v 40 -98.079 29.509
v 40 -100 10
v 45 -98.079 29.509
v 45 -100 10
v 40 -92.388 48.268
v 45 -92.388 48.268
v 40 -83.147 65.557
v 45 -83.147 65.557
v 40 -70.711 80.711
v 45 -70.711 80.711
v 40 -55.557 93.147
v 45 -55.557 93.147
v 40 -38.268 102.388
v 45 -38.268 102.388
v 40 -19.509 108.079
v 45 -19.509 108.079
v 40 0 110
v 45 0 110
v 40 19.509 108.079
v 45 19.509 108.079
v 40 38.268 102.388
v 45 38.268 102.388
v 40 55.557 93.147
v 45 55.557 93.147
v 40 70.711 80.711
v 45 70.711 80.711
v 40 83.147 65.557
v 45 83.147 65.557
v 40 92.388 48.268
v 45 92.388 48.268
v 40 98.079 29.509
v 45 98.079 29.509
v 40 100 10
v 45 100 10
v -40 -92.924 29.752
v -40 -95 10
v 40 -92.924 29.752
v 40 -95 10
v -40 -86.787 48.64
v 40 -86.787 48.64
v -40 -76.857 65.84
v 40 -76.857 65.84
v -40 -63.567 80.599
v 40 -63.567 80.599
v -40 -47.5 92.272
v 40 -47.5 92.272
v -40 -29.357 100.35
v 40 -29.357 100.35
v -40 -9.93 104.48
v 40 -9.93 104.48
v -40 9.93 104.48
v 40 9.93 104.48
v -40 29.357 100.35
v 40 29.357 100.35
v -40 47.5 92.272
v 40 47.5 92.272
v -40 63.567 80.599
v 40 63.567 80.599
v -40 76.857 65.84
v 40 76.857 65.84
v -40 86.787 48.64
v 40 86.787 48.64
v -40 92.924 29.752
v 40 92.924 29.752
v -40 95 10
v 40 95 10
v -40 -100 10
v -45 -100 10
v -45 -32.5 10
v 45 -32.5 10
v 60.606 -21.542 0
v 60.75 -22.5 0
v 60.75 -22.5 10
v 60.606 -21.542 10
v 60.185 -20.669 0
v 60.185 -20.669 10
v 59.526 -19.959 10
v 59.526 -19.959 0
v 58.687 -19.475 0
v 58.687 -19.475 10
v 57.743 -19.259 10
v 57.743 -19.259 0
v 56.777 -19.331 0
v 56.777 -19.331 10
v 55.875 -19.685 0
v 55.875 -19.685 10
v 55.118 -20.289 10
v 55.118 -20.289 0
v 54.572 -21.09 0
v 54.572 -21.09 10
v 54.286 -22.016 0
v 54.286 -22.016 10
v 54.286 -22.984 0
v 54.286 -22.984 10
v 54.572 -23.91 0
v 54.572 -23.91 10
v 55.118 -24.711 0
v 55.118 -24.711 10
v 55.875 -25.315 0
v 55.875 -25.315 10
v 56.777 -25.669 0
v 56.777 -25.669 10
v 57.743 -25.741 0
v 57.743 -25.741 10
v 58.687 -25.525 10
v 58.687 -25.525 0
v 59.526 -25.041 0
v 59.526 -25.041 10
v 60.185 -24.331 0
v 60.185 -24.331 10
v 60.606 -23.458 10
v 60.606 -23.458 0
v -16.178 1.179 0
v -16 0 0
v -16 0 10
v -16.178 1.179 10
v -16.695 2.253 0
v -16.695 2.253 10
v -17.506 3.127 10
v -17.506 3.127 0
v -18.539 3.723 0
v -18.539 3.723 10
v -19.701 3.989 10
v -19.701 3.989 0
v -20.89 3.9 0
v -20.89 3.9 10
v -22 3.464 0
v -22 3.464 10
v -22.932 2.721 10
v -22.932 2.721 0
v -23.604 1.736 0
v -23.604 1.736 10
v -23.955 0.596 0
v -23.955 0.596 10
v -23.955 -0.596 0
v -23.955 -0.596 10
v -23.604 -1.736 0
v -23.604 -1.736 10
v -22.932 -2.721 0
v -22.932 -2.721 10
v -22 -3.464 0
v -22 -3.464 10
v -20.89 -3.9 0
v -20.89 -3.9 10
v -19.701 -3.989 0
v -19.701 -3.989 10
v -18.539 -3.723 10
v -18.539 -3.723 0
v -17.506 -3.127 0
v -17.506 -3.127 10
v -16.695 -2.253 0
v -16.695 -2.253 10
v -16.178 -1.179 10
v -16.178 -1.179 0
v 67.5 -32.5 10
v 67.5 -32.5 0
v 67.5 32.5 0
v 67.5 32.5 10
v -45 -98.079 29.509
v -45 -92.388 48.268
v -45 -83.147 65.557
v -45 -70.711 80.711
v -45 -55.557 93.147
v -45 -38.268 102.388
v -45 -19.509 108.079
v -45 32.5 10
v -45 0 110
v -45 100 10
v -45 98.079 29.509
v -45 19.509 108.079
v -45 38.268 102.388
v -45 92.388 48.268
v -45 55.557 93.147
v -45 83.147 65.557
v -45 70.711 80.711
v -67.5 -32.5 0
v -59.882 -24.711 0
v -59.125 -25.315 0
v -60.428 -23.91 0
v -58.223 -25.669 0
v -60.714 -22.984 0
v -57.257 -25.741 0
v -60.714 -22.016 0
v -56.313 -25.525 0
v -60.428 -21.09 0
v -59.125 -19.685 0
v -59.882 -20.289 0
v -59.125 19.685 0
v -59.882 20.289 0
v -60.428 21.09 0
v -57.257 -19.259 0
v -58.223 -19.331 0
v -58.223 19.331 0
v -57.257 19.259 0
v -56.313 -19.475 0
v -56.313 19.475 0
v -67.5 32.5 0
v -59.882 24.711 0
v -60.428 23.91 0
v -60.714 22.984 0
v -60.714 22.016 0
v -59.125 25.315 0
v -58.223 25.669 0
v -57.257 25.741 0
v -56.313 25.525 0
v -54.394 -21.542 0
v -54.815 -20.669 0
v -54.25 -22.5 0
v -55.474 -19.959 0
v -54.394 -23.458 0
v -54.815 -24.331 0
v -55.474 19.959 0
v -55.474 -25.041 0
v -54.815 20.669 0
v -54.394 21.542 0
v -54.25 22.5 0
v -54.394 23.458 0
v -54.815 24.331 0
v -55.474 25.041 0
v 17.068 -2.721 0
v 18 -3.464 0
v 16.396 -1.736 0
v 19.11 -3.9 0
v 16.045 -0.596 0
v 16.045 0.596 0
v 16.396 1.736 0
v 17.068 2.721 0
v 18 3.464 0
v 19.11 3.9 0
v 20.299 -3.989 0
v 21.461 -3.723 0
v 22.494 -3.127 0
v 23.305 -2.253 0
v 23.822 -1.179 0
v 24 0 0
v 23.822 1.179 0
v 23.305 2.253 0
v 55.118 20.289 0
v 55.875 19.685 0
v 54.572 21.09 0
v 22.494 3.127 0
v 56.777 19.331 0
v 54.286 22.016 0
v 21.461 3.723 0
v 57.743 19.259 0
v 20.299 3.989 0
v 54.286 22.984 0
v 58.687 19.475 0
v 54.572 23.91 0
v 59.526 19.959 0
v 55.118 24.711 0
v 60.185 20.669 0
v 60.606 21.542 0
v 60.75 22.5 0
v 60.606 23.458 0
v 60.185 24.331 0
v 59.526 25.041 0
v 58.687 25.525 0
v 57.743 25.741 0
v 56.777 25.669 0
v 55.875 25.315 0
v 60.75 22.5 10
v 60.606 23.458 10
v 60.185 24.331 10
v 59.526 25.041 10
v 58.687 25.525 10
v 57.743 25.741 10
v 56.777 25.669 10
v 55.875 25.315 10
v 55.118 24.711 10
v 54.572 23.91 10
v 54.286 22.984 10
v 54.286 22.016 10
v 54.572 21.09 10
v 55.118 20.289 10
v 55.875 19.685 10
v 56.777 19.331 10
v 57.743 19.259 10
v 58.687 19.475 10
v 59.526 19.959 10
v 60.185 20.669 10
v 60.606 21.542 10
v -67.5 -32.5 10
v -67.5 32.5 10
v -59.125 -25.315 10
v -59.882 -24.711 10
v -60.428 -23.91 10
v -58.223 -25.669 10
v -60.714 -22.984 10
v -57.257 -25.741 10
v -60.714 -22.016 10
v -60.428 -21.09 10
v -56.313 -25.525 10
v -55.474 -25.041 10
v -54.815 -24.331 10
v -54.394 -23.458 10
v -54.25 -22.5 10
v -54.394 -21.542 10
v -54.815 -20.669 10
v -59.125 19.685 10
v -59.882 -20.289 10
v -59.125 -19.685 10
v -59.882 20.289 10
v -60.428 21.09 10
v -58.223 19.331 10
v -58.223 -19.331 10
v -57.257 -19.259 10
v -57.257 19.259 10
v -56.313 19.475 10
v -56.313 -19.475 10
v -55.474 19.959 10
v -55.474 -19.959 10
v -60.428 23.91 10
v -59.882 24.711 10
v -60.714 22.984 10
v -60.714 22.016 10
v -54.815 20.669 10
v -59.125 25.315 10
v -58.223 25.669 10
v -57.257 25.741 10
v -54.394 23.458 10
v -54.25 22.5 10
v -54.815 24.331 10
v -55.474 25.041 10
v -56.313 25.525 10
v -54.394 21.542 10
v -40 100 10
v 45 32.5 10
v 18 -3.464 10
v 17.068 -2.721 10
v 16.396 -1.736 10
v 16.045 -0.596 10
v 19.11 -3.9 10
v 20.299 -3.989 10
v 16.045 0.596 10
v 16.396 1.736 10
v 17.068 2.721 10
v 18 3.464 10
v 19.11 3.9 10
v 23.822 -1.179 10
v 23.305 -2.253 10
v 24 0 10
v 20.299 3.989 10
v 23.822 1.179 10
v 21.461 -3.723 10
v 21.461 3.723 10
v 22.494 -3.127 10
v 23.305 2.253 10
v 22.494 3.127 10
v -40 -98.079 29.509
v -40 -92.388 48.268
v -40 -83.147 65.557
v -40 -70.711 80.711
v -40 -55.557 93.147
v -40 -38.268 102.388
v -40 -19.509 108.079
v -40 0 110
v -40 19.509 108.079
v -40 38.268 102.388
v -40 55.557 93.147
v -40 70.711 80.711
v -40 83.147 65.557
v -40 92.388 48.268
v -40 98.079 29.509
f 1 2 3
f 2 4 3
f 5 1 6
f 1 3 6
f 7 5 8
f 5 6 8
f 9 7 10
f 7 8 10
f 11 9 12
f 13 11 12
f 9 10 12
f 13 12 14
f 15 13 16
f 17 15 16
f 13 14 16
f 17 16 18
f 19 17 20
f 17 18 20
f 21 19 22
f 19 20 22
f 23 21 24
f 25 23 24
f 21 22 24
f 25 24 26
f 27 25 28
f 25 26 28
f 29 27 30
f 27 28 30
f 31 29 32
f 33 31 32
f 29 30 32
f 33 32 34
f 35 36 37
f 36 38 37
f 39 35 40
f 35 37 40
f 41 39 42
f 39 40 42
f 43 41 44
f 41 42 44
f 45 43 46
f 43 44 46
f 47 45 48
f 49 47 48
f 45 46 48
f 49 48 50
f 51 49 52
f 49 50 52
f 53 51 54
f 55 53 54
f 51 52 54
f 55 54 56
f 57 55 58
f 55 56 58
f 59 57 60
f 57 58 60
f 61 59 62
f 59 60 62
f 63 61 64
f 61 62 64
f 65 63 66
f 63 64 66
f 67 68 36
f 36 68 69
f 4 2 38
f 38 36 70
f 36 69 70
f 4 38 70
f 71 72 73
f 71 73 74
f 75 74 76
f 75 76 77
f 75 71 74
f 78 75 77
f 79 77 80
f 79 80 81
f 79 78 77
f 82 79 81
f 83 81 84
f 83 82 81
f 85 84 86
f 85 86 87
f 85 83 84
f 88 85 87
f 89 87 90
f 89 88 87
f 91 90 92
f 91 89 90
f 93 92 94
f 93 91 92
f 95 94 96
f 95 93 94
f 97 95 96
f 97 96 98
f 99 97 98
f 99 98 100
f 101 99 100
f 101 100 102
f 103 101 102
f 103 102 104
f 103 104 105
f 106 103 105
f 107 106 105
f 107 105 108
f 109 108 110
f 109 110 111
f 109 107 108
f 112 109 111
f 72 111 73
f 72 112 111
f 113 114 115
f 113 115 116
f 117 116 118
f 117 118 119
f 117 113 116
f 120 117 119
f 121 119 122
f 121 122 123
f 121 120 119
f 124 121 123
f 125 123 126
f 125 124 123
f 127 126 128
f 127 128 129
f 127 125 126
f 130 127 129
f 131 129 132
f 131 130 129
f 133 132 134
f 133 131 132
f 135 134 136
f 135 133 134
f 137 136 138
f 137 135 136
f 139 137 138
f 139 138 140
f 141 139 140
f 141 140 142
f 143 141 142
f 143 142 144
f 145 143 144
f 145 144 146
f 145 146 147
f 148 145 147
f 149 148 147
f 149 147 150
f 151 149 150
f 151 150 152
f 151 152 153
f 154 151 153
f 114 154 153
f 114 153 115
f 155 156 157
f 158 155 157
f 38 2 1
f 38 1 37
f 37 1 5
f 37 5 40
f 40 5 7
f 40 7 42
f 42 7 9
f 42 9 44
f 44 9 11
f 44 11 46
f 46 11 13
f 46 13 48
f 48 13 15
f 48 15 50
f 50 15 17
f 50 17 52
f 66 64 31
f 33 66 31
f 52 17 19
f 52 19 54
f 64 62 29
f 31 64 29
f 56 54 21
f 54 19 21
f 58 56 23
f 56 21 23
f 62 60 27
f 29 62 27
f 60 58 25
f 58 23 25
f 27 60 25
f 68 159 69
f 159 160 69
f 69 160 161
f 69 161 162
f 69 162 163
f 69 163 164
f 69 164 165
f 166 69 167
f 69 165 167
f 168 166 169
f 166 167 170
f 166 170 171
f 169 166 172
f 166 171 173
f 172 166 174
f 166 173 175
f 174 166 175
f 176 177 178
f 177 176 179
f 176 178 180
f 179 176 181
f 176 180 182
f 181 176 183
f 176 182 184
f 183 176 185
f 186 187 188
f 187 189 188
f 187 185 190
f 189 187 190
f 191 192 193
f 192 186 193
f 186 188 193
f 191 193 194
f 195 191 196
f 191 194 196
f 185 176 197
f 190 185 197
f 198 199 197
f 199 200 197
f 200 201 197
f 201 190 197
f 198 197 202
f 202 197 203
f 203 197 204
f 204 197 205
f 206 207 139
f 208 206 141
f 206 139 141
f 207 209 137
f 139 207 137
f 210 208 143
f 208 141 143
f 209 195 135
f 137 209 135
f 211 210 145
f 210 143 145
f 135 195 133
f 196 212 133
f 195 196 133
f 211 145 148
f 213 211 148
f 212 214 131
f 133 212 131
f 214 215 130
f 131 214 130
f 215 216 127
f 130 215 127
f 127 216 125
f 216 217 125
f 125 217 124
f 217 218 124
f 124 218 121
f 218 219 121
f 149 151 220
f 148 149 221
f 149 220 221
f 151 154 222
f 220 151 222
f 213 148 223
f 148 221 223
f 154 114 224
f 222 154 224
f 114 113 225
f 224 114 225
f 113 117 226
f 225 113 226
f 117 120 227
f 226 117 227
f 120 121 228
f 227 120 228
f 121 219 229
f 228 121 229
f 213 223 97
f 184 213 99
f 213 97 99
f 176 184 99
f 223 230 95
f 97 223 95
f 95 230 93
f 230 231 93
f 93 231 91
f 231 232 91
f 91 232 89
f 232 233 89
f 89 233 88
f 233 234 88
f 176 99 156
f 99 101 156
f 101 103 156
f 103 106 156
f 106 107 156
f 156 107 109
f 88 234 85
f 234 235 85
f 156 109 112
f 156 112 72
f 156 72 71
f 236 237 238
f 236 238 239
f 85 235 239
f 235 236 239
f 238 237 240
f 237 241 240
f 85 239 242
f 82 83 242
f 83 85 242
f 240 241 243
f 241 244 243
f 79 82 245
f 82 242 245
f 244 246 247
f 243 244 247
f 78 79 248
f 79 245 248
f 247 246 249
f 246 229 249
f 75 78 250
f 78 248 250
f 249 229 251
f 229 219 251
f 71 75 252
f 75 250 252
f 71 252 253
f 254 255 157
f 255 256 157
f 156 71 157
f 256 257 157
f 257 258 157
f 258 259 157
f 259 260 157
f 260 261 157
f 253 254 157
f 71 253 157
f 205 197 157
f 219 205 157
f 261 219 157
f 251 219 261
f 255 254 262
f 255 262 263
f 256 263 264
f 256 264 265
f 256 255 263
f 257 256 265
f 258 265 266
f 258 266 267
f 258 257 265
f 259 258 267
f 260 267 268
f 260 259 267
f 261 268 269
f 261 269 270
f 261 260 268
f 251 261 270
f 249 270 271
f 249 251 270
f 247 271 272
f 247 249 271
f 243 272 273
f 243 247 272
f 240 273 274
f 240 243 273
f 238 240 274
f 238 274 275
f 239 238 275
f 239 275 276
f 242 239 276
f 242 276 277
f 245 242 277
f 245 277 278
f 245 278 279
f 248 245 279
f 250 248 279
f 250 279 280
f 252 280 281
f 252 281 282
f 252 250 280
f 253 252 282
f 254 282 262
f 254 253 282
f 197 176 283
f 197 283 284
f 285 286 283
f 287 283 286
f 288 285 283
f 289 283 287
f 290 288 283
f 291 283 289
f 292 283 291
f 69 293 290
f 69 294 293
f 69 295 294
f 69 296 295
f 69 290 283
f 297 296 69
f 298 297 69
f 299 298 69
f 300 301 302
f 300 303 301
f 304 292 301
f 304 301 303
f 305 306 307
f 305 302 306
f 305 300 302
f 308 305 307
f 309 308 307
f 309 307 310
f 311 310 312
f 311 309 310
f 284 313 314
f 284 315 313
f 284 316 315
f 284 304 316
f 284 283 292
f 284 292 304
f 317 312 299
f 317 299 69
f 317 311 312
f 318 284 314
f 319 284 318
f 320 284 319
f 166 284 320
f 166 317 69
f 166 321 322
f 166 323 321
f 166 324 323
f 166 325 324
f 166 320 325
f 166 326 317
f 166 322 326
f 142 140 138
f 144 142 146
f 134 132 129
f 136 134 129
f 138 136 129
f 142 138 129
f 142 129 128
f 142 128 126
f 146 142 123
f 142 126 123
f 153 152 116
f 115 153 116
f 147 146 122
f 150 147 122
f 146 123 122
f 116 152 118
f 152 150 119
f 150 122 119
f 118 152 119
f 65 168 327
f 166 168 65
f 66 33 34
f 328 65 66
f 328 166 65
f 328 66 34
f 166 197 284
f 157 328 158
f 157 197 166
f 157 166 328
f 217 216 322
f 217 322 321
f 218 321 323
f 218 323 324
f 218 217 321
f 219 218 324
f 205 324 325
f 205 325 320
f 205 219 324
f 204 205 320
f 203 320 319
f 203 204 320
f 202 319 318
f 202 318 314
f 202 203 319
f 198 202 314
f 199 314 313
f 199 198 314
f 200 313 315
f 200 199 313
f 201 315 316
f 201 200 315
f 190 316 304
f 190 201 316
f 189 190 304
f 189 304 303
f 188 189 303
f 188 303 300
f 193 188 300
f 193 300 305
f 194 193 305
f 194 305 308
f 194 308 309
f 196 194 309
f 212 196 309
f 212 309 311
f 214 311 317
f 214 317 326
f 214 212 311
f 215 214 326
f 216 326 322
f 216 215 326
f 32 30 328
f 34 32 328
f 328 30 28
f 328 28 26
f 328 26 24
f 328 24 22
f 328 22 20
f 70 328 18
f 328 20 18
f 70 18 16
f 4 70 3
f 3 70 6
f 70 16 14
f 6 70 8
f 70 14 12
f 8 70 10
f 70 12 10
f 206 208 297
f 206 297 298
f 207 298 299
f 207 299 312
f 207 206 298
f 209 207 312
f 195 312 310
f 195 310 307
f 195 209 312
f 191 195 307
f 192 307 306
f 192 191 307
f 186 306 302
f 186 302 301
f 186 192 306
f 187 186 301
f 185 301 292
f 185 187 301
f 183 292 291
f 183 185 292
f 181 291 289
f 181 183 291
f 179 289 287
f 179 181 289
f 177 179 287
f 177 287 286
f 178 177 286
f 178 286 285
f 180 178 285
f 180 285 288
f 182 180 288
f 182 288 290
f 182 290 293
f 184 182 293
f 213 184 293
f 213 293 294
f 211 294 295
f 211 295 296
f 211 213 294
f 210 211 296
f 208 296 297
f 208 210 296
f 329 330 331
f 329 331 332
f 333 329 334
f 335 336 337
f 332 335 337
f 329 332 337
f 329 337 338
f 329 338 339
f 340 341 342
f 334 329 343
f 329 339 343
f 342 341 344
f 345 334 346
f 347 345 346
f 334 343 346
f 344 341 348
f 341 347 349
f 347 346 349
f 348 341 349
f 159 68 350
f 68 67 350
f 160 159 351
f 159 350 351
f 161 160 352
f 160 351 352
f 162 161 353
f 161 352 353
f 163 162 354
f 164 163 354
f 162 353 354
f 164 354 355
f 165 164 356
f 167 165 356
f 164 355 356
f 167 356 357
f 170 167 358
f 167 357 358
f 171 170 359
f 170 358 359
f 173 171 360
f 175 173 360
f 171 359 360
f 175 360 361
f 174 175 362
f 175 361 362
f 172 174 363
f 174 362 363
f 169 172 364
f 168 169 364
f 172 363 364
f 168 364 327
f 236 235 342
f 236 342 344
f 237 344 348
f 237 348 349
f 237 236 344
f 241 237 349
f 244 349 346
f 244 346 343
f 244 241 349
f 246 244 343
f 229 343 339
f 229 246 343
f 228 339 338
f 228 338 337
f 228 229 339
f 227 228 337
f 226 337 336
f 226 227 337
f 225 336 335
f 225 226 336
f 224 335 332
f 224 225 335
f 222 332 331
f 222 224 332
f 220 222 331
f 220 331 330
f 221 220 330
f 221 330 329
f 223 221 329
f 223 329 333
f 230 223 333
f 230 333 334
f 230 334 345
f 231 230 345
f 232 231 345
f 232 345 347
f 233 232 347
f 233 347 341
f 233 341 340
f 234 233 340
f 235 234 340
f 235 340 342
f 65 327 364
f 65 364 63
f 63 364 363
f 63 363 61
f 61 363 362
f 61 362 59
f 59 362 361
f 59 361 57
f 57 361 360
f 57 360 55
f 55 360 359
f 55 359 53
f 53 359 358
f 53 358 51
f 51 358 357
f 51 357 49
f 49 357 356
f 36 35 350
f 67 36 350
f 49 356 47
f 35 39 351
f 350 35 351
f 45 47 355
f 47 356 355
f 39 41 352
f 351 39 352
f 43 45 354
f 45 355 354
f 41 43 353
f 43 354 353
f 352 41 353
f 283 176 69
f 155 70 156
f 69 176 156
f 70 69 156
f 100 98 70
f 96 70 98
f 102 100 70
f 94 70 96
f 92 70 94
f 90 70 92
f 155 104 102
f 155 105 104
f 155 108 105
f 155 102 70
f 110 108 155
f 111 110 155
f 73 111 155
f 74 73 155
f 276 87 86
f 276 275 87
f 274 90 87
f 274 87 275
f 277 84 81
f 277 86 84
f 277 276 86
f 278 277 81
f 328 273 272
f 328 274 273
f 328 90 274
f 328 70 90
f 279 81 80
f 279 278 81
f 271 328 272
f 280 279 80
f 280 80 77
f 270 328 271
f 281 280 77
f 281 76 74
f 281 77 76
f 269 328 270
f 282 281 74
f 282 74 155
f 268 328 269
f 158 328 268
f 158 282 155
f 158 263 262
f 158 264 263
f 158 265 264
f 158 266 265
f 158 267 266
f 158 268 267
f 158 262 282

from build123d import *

# Parameters (mm, degrees)
F0_W     = 135
F0_H     = 65
F0_R     = 3.25
F0_R_2   = 4
F1_DEPTH = 10
F3_ANGLE = -180


with BuildPart() as f1:
    # F0 (on Top) → F1 (new body)
    with BuildSketch(Plane.XY):
        Rectangle(F0_W, F0_H)
        with Locations((-57.5, -22.5)):
            Circle(F0_R, mode=Mode.SUBTRACT)
        with Locations((57.5, -22.5)):
            Circle(F0_R, mode=Mode.SUBTRACT)
        with Locations((-20, 0)):
            Circle(F0_R_2, mode=Mode.SUBTRACT)
        with Locations((-57.5, 22.5)):
            Circle(F0_R, mode=Mode.SUBTRACT)
        with Locations((20, 0)):
            Circle(F0_R_2, mode=Mode.SUBTRACT)
        with Locations((57.5, 22.5)):
            Circle(F0_R, mode=Mode.SUBTRACT)
    extrude(amount=F1_DEPTH)

    # F2 (on face) → F3 (revolve)
    with BuildSketch(Plane.XY.offset(10)):
        Polygon((40, 0), (0, 0), (-40, 0), (-40, -95), (0, -95), (40, -95), align=None)
        Polygon((-40, -95), (-40, 0), (-45, 0), (-45, -100), (-40, -100), align=None)
        Polygon((45, 0), (40, 0), (40, -95), (40, -100), (45, -100), align=None)
    revolve(axis=Axis((-5.601771, 0, 10), (1, 0, 0)), revolution_arc=F3_ANGLE)


solid = f1.part
